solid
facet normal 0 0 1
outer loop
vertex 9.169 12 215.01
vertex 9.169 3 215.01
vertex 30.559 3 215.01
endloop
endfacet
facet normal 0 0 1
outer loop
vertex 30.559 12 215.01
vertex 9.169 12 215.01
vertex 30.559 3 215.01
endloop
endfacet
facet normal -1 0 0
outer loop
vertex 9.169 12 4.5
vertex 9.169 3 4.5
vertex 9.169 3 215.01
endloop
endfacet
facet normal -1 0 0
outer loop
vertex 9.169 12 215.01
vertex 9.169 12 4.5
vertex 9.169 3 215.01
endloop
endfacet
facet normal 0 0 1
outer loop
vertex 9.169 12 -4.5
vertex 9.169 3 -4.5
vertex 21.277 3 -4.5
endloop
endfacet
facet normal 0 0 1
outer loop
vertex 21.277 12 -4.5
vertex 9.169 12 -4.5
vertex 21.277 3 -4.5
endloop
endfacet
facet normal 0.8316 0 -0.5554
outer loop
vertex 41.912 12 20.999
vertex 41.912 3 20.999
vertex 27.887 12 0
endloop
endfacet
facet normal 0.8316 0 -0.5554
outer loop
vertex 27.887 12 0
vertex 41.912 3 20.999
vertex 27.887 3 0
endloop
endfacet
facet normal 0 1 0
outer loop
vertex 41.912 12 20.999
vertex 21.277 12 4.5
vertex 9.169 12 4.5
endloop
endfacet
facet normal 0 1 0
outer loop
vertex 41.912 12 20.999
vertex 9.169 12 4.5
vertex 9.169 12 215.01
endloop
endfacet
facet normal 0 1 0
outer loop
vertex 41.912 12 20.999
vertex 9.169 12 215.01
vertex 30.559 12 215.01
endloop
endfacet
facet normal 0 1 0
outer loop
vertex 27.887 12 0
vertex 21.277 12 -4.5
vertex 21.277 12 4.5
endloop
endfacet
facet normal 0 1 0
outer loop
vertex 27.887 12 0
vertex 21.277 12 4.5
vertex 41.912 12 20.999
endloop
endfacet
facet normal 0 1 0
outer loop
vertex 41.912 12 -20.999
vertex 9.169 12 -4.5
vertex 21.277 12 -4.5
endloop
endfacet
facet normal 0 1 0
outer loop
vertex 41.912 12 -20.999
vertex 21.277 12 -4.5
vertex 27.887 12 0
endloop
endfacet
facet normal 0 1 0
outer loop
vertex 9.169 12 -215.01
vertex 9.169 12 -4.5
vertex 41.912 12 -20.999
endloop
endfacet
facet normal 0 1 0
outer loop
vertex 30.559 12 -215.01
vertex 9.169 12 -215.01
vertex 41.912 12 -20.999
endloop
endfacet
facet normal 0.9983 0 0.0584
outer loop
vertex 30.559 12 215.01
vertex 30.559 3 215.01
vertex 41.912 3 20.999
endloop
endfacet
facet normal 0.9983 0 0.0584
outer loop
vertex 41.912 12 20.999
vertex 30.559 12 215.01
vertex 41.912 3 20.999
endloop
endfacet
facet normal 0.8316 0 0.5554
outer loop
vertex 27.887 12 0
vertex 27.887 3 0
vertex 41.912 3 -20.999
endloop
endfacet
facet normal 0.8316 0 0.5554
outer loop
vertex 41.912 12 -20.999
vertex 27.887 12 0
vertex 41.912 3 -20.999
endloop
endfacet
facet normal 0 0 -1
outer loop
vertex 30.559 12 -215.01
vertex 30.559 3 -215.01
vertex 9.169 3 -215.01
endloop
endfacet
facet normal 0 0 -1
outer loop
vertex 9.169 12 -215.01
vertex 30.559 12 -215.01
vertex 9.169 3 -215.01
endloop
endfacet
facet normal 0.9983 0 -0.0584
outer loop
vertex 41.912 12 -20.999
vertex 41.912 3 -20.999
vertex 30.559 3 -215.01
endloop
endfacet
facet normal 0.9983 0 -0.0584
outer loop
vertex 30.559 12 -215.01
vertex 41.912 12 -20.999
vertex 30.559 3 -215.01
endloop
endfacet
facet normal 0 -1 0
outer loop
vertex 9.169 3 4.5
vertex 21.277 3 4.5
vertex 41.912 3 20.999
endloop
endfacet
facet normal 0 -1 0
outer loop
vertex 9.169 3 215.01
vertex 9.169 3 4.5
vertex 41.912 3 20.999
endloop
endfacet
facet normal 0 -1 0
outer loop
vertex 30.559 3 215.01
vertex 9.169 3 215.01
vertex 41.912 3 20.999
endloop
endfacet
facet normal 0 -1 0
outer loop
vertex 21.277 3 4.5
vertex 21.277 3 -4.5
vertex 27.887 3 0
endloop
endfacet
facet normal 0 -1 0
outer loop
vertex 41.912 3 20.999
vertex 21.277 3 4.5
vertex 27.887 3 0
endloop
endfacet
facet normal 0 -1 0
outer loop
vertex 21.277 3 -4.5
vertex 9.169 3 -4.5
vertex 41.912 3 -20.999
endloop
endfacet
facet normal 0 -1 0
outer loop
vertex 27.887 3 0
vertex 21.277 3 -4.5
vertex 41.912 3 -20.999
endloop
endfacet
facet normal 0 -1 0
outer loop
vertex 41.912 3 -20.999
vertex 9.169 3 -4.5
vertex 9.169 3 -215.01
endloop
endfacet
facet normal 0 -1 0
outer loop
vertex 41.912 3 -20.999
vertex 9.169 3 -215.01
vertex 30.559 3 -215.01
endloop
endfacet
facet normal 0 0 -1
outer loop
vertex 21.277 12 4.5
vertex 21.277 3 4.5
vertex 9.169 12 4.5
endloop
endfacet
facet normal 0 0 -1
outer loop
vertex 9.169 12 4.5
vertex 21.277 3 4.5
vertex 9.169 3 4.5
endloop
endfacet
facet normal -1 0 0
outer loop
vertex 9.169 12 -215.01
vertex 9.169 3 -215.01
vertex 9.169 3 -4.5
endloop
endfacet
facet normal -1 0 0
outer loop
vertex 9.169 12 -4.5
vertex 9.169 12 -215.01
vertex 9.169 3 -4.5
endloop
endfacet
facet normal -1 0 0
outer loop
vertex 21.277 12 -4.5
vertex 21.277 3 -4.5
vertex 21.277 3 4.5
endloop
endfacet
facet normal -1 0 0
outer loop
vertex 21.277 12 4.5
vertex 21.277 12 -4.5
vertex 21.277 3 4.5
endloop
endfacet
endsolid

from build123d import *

# Parameters (mm, degrees)
BOSS_EXTRUDE1_DEPTH = 15
SCALE1_SCALE        = 0.6


with BuildPart() as part:
    # Sketch1 → Boss-Extrude1 (new body)
    with BuildSketch(Plane(origin=(0, 0, 0), x_dir=(1, 0, 0), z_dir=(0, 1, 0))):
        Polygon((0, 358.35), (0, 7.5), (20.180404561, 7.5), (20.180404561, -7.5), (0, -7.5), (0, -358.35), (35.650600343, -358.35), (54.572500068, -34.997934227), (31.19655837, 0), (54.572500068, 34.997934227), (35.650600343, 358.35), align=None)
    extrude(amount=BOSS_EXTRUDE1_DEPTH)


with BuildPart() as part_1:
    # Scale1: scaled about (22.921989844, 7.5, 0)
    add(part.part.scale(SCALE1_SCALE).moved(Location((9.168795938, 3, 0))))


solid = part_1.part
